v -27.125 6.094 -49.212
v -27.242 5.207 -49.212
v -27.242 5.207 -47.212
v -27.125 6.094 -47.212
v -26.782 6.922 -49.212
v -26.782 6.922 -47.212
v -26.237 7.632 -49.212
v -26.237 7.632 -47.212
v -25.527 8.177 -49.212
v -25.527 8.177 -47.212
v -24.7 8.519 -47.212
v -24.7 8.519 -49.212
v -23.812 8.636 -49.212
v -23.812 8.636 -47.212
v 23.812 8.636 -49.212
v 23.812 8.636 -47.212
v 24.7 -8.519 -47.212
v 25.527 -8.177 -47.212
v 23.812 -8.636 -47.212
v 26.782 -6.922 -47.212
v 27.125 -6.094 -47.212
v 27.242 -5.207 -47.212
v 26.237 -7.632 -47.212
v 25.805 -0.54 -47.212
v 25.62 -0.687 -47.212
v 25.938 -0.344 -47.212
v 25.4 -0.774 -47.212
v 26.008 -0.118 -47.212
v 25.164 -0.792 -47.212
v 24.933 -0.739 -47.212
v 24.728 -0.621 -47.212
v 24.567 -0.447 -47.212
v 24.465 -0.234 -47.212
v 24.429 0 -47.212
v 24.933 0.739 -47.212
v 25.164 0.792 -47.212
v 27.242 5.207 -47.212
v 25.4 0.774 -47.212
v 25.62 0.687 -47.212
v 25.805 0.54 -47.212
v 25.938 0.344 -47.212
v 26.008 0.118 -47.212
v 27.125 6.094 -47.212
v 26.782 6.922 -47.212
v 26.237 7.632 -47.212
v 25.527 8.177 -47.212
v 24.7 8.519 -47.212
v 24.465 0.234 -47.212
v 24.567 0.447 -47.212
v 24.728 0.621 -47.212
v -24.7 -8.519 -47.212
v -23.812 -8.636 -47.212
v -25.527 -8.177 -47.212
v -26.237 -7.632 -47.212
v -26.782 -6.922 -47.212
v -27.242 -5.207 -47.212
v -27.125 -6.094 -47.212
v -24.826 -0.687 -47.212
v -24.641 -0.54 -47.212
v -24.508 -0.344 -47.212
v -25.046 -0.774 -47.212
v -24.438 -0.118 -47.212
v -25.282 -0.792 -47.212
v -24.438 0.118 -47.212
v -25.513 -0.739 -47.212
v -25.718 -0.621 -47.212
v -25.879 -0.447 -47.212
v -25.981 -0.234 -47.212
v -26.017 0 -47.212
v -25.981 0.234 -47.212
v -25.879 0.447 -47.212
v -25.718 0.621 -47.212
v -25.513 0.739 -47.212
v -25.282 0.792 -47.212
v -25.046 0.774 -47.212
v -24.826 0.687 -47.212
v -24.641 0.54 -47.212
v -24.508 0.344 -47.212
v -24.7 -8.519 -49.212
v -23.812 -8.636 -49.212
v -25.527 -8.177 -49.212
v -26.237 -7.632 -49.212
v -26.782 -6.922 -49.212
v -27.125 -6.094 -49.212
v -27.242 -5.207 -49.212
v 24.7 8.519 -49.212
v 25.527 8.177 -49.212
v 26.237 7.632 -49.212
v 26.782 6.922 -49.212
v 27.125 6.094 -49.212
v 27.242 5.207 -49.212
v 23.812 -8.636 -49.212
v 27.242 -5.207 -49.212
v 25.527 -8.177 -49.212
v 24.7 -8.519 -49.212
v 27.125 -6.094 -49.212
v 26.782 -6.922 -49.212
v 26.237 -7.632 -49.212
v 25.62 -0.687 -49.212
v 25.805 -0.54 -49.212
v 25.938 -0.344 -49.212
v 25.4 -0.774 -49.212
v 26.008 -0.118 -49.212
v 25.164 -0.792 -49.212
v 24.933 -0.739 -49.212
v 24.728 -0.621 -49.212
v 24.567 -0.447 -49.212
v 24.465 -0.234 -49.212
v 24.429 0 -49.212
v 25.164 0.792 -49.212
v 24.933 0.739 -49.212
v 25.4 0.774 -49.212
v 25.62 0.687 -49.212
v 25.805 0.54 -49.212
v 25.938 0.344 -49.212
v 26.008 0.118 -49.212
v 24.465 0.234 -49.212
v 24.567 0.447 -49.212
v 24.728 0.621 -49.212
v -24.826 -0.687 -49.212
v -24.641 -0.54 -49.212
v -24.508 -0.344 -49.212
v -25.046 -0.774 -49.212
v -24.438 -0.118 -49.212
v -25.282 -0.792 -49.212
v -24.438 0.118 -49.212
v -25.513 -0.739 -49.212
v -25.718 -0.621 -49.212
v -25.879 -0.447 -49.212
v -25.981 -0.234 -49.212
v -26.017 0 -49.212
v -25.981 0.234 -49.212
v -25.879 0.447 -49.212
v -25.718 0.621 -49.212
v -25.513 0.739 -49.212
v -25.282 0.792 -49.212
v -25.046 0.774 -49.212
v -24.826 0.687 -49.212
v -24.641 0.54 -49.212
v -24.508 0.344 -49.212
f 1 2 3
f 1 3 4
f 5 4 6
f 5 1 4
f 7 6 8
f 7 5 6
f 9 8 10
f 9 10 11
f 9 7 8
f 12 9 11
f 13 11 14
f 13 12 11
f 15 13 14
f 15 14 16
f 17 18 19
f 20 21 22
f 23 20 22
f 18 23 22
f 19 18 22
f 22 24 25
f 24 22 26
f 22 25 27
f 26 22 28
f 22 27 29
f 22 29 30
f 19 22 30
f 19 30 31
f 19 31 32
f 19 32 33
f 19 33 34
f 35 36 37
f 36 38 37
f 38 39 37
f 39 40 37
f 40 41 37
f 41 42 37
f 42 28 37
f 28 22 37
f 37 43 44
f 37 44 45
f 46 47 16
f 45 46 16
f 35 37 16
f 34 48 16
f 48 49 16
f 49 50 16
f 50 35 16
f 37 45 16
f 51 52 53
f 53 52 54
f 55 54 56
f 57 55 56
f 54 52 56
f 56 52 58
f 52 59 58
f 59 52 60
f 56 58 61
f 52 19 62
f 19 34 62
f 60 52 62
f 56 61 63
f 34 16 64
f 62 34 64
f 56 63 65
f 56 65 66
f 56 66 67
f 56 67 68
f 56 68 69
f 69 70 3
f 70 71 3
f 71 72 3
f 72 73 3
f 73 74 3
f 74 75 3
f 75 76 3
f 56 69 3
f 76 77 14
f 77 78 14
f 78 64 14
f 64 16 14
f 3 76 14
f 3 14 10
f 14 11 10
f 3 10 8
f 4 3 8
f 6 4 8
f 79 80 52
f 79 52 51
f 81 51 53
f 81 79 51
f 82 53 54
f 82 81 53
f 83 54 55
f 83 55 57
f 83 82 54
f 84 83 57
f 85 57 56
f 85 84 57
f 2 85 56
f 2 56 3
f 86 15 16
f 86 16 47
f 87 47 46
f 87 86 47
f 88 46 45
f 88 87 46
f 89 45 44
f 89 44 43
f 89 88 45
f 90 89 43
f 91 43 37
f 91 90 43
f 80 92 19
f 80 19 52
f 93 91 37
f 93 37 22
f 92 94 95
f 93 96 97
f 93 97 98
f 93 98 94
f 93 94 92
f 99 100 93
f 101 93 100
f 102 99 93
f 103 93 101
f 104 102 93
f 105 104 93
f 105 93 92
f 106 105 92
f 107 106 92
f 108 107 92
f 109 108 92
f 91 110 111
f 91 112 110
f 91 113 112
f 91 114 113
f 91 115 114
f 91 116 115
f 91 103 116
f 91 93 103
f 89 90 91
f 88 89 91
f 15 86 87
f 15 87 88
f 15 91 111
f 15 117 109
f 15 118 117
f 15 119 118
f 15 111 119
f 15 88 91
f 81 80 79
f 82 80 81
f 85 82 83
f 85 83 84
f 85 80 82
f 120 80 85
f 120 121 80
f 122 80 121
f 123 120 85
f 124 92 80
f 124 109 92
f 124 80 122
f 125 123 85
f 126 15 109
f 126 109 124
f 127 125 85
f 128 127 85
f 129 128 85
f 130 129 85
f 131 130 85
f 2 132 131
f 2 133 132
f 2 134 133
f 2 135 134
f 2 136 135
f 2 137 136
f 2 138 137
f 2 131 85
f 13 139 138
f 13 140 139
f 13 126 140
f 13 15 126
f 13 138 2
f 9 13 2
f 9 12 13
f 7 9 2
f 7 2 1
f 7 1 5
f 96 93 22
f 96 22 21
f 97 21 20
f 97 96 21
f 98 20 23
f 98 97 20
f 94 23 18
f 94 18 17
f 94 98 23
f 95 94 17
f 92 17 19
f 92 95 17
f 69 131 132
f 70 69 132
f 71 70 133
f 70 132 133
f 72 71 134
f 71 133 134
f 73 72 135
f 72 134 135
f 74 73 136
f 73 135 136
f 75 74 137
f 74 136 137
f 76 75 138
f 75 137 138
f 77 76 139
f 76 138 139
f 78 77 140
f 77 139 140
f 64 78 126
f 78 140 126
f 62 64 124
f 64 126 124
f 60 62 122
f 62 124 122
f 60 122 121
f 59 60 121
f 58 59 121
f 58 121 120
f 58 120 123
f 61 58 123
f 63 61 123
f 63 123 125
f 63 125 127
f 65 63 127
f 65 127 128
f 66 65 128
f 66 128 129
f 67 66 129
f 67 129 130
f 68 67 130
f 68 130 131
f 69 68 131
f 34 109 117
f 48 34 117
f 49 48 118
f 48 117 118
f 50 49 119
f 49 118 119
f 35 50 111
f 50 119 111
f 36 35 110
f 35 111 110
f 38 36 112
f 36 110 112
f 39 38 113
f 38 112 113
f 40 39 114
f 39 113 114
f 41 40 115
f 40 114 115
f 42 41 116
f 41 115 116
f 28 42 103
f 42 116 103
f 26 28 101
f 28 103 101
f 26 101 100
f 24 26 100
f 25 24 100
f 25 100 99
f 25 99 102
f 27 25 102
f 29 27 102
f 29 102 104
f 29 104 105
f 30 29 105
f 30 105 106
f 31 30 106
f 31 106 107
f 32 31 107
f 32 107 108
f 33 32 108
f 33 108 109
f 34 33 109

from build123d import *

# Parameters (mm, degrees)
BOSS_EXTRUDE1_DEPTH                = 2
F_1_16_0_0625_DIAMETER_HOLE2_D     = 1.5875
F_1_16_0_0625_DIAMETER_HOLE2_DEPTH = 19.05
F_1_16_0_0625_DIAMETER_HOLE2_TIP   = 0.476933116


with BuildPart() as part:
    # Sketch1 → Boss-Extrude1 (new body)
    with BuildSketch(Plane(origin=(0, 0, -49.2125), x_dir=(-1, 0, 0), z_dir=(0, 0, -1))):
        with BuildLine():
            Line((23.8125, 8.636), (-23.8125, 8.636))
            ThreePointArc((-23.8125, 8.636), (-26.237169153, 7.631669153), (-27.2415, 5.207))
            Line((-27.2415, 5.207), (-27.2415, -5.207))
            ThreePointArc((-27.2415, -5.207), (-26.237169153, -7.631669153), (-23.8125, -8.636))
            Line((-23.8125, -8.636), (23.8125, -8.636))
            ThreePointArc((23.8125, -8.636), (26.237169153, -7.631669153), (27.2415, -5.207))
            Line((27.2415, -5.207), (27.2415, 5.207))
            ThreePointArc((27.2415, 5.207), (26.237169153, 7.631669153), (23.8125, 8.636))
        make_face()
    extrude(amount=-BOSS_EXTRUDE1_DEPTH)

    # 1/16 (0.0625) Diameter Hole2
    with Locations(Plane(origin=(25.223, 0, -47.2125), x_dir=(1, 0, 0), z_dir=(0, 0, 1))):
        with Locations((0, 0), (-50.446, 0)):
            Hole(F_1_16_0_0625_DIAMETER_HOLE2_D / 2, depth=F_1_16_0_0625_DIAMETER_HOLE2_DEPTH)
            with Locations((0, 0, -(F_1_16_0_0625_DIAMETER_HOLE2_DEPTH + F_1_16_0_0625_DIAMETER_HOLE2_TIP / 2))):  # 118° drill point
                Cone(0, F_1_16_0_0625_DIAMETER_HOLE2_D / 2, F_1_16_0_0625_DIAMETER_HOLE2_TIP, mode=Mode.SUBTRACT)


solid = part.part
